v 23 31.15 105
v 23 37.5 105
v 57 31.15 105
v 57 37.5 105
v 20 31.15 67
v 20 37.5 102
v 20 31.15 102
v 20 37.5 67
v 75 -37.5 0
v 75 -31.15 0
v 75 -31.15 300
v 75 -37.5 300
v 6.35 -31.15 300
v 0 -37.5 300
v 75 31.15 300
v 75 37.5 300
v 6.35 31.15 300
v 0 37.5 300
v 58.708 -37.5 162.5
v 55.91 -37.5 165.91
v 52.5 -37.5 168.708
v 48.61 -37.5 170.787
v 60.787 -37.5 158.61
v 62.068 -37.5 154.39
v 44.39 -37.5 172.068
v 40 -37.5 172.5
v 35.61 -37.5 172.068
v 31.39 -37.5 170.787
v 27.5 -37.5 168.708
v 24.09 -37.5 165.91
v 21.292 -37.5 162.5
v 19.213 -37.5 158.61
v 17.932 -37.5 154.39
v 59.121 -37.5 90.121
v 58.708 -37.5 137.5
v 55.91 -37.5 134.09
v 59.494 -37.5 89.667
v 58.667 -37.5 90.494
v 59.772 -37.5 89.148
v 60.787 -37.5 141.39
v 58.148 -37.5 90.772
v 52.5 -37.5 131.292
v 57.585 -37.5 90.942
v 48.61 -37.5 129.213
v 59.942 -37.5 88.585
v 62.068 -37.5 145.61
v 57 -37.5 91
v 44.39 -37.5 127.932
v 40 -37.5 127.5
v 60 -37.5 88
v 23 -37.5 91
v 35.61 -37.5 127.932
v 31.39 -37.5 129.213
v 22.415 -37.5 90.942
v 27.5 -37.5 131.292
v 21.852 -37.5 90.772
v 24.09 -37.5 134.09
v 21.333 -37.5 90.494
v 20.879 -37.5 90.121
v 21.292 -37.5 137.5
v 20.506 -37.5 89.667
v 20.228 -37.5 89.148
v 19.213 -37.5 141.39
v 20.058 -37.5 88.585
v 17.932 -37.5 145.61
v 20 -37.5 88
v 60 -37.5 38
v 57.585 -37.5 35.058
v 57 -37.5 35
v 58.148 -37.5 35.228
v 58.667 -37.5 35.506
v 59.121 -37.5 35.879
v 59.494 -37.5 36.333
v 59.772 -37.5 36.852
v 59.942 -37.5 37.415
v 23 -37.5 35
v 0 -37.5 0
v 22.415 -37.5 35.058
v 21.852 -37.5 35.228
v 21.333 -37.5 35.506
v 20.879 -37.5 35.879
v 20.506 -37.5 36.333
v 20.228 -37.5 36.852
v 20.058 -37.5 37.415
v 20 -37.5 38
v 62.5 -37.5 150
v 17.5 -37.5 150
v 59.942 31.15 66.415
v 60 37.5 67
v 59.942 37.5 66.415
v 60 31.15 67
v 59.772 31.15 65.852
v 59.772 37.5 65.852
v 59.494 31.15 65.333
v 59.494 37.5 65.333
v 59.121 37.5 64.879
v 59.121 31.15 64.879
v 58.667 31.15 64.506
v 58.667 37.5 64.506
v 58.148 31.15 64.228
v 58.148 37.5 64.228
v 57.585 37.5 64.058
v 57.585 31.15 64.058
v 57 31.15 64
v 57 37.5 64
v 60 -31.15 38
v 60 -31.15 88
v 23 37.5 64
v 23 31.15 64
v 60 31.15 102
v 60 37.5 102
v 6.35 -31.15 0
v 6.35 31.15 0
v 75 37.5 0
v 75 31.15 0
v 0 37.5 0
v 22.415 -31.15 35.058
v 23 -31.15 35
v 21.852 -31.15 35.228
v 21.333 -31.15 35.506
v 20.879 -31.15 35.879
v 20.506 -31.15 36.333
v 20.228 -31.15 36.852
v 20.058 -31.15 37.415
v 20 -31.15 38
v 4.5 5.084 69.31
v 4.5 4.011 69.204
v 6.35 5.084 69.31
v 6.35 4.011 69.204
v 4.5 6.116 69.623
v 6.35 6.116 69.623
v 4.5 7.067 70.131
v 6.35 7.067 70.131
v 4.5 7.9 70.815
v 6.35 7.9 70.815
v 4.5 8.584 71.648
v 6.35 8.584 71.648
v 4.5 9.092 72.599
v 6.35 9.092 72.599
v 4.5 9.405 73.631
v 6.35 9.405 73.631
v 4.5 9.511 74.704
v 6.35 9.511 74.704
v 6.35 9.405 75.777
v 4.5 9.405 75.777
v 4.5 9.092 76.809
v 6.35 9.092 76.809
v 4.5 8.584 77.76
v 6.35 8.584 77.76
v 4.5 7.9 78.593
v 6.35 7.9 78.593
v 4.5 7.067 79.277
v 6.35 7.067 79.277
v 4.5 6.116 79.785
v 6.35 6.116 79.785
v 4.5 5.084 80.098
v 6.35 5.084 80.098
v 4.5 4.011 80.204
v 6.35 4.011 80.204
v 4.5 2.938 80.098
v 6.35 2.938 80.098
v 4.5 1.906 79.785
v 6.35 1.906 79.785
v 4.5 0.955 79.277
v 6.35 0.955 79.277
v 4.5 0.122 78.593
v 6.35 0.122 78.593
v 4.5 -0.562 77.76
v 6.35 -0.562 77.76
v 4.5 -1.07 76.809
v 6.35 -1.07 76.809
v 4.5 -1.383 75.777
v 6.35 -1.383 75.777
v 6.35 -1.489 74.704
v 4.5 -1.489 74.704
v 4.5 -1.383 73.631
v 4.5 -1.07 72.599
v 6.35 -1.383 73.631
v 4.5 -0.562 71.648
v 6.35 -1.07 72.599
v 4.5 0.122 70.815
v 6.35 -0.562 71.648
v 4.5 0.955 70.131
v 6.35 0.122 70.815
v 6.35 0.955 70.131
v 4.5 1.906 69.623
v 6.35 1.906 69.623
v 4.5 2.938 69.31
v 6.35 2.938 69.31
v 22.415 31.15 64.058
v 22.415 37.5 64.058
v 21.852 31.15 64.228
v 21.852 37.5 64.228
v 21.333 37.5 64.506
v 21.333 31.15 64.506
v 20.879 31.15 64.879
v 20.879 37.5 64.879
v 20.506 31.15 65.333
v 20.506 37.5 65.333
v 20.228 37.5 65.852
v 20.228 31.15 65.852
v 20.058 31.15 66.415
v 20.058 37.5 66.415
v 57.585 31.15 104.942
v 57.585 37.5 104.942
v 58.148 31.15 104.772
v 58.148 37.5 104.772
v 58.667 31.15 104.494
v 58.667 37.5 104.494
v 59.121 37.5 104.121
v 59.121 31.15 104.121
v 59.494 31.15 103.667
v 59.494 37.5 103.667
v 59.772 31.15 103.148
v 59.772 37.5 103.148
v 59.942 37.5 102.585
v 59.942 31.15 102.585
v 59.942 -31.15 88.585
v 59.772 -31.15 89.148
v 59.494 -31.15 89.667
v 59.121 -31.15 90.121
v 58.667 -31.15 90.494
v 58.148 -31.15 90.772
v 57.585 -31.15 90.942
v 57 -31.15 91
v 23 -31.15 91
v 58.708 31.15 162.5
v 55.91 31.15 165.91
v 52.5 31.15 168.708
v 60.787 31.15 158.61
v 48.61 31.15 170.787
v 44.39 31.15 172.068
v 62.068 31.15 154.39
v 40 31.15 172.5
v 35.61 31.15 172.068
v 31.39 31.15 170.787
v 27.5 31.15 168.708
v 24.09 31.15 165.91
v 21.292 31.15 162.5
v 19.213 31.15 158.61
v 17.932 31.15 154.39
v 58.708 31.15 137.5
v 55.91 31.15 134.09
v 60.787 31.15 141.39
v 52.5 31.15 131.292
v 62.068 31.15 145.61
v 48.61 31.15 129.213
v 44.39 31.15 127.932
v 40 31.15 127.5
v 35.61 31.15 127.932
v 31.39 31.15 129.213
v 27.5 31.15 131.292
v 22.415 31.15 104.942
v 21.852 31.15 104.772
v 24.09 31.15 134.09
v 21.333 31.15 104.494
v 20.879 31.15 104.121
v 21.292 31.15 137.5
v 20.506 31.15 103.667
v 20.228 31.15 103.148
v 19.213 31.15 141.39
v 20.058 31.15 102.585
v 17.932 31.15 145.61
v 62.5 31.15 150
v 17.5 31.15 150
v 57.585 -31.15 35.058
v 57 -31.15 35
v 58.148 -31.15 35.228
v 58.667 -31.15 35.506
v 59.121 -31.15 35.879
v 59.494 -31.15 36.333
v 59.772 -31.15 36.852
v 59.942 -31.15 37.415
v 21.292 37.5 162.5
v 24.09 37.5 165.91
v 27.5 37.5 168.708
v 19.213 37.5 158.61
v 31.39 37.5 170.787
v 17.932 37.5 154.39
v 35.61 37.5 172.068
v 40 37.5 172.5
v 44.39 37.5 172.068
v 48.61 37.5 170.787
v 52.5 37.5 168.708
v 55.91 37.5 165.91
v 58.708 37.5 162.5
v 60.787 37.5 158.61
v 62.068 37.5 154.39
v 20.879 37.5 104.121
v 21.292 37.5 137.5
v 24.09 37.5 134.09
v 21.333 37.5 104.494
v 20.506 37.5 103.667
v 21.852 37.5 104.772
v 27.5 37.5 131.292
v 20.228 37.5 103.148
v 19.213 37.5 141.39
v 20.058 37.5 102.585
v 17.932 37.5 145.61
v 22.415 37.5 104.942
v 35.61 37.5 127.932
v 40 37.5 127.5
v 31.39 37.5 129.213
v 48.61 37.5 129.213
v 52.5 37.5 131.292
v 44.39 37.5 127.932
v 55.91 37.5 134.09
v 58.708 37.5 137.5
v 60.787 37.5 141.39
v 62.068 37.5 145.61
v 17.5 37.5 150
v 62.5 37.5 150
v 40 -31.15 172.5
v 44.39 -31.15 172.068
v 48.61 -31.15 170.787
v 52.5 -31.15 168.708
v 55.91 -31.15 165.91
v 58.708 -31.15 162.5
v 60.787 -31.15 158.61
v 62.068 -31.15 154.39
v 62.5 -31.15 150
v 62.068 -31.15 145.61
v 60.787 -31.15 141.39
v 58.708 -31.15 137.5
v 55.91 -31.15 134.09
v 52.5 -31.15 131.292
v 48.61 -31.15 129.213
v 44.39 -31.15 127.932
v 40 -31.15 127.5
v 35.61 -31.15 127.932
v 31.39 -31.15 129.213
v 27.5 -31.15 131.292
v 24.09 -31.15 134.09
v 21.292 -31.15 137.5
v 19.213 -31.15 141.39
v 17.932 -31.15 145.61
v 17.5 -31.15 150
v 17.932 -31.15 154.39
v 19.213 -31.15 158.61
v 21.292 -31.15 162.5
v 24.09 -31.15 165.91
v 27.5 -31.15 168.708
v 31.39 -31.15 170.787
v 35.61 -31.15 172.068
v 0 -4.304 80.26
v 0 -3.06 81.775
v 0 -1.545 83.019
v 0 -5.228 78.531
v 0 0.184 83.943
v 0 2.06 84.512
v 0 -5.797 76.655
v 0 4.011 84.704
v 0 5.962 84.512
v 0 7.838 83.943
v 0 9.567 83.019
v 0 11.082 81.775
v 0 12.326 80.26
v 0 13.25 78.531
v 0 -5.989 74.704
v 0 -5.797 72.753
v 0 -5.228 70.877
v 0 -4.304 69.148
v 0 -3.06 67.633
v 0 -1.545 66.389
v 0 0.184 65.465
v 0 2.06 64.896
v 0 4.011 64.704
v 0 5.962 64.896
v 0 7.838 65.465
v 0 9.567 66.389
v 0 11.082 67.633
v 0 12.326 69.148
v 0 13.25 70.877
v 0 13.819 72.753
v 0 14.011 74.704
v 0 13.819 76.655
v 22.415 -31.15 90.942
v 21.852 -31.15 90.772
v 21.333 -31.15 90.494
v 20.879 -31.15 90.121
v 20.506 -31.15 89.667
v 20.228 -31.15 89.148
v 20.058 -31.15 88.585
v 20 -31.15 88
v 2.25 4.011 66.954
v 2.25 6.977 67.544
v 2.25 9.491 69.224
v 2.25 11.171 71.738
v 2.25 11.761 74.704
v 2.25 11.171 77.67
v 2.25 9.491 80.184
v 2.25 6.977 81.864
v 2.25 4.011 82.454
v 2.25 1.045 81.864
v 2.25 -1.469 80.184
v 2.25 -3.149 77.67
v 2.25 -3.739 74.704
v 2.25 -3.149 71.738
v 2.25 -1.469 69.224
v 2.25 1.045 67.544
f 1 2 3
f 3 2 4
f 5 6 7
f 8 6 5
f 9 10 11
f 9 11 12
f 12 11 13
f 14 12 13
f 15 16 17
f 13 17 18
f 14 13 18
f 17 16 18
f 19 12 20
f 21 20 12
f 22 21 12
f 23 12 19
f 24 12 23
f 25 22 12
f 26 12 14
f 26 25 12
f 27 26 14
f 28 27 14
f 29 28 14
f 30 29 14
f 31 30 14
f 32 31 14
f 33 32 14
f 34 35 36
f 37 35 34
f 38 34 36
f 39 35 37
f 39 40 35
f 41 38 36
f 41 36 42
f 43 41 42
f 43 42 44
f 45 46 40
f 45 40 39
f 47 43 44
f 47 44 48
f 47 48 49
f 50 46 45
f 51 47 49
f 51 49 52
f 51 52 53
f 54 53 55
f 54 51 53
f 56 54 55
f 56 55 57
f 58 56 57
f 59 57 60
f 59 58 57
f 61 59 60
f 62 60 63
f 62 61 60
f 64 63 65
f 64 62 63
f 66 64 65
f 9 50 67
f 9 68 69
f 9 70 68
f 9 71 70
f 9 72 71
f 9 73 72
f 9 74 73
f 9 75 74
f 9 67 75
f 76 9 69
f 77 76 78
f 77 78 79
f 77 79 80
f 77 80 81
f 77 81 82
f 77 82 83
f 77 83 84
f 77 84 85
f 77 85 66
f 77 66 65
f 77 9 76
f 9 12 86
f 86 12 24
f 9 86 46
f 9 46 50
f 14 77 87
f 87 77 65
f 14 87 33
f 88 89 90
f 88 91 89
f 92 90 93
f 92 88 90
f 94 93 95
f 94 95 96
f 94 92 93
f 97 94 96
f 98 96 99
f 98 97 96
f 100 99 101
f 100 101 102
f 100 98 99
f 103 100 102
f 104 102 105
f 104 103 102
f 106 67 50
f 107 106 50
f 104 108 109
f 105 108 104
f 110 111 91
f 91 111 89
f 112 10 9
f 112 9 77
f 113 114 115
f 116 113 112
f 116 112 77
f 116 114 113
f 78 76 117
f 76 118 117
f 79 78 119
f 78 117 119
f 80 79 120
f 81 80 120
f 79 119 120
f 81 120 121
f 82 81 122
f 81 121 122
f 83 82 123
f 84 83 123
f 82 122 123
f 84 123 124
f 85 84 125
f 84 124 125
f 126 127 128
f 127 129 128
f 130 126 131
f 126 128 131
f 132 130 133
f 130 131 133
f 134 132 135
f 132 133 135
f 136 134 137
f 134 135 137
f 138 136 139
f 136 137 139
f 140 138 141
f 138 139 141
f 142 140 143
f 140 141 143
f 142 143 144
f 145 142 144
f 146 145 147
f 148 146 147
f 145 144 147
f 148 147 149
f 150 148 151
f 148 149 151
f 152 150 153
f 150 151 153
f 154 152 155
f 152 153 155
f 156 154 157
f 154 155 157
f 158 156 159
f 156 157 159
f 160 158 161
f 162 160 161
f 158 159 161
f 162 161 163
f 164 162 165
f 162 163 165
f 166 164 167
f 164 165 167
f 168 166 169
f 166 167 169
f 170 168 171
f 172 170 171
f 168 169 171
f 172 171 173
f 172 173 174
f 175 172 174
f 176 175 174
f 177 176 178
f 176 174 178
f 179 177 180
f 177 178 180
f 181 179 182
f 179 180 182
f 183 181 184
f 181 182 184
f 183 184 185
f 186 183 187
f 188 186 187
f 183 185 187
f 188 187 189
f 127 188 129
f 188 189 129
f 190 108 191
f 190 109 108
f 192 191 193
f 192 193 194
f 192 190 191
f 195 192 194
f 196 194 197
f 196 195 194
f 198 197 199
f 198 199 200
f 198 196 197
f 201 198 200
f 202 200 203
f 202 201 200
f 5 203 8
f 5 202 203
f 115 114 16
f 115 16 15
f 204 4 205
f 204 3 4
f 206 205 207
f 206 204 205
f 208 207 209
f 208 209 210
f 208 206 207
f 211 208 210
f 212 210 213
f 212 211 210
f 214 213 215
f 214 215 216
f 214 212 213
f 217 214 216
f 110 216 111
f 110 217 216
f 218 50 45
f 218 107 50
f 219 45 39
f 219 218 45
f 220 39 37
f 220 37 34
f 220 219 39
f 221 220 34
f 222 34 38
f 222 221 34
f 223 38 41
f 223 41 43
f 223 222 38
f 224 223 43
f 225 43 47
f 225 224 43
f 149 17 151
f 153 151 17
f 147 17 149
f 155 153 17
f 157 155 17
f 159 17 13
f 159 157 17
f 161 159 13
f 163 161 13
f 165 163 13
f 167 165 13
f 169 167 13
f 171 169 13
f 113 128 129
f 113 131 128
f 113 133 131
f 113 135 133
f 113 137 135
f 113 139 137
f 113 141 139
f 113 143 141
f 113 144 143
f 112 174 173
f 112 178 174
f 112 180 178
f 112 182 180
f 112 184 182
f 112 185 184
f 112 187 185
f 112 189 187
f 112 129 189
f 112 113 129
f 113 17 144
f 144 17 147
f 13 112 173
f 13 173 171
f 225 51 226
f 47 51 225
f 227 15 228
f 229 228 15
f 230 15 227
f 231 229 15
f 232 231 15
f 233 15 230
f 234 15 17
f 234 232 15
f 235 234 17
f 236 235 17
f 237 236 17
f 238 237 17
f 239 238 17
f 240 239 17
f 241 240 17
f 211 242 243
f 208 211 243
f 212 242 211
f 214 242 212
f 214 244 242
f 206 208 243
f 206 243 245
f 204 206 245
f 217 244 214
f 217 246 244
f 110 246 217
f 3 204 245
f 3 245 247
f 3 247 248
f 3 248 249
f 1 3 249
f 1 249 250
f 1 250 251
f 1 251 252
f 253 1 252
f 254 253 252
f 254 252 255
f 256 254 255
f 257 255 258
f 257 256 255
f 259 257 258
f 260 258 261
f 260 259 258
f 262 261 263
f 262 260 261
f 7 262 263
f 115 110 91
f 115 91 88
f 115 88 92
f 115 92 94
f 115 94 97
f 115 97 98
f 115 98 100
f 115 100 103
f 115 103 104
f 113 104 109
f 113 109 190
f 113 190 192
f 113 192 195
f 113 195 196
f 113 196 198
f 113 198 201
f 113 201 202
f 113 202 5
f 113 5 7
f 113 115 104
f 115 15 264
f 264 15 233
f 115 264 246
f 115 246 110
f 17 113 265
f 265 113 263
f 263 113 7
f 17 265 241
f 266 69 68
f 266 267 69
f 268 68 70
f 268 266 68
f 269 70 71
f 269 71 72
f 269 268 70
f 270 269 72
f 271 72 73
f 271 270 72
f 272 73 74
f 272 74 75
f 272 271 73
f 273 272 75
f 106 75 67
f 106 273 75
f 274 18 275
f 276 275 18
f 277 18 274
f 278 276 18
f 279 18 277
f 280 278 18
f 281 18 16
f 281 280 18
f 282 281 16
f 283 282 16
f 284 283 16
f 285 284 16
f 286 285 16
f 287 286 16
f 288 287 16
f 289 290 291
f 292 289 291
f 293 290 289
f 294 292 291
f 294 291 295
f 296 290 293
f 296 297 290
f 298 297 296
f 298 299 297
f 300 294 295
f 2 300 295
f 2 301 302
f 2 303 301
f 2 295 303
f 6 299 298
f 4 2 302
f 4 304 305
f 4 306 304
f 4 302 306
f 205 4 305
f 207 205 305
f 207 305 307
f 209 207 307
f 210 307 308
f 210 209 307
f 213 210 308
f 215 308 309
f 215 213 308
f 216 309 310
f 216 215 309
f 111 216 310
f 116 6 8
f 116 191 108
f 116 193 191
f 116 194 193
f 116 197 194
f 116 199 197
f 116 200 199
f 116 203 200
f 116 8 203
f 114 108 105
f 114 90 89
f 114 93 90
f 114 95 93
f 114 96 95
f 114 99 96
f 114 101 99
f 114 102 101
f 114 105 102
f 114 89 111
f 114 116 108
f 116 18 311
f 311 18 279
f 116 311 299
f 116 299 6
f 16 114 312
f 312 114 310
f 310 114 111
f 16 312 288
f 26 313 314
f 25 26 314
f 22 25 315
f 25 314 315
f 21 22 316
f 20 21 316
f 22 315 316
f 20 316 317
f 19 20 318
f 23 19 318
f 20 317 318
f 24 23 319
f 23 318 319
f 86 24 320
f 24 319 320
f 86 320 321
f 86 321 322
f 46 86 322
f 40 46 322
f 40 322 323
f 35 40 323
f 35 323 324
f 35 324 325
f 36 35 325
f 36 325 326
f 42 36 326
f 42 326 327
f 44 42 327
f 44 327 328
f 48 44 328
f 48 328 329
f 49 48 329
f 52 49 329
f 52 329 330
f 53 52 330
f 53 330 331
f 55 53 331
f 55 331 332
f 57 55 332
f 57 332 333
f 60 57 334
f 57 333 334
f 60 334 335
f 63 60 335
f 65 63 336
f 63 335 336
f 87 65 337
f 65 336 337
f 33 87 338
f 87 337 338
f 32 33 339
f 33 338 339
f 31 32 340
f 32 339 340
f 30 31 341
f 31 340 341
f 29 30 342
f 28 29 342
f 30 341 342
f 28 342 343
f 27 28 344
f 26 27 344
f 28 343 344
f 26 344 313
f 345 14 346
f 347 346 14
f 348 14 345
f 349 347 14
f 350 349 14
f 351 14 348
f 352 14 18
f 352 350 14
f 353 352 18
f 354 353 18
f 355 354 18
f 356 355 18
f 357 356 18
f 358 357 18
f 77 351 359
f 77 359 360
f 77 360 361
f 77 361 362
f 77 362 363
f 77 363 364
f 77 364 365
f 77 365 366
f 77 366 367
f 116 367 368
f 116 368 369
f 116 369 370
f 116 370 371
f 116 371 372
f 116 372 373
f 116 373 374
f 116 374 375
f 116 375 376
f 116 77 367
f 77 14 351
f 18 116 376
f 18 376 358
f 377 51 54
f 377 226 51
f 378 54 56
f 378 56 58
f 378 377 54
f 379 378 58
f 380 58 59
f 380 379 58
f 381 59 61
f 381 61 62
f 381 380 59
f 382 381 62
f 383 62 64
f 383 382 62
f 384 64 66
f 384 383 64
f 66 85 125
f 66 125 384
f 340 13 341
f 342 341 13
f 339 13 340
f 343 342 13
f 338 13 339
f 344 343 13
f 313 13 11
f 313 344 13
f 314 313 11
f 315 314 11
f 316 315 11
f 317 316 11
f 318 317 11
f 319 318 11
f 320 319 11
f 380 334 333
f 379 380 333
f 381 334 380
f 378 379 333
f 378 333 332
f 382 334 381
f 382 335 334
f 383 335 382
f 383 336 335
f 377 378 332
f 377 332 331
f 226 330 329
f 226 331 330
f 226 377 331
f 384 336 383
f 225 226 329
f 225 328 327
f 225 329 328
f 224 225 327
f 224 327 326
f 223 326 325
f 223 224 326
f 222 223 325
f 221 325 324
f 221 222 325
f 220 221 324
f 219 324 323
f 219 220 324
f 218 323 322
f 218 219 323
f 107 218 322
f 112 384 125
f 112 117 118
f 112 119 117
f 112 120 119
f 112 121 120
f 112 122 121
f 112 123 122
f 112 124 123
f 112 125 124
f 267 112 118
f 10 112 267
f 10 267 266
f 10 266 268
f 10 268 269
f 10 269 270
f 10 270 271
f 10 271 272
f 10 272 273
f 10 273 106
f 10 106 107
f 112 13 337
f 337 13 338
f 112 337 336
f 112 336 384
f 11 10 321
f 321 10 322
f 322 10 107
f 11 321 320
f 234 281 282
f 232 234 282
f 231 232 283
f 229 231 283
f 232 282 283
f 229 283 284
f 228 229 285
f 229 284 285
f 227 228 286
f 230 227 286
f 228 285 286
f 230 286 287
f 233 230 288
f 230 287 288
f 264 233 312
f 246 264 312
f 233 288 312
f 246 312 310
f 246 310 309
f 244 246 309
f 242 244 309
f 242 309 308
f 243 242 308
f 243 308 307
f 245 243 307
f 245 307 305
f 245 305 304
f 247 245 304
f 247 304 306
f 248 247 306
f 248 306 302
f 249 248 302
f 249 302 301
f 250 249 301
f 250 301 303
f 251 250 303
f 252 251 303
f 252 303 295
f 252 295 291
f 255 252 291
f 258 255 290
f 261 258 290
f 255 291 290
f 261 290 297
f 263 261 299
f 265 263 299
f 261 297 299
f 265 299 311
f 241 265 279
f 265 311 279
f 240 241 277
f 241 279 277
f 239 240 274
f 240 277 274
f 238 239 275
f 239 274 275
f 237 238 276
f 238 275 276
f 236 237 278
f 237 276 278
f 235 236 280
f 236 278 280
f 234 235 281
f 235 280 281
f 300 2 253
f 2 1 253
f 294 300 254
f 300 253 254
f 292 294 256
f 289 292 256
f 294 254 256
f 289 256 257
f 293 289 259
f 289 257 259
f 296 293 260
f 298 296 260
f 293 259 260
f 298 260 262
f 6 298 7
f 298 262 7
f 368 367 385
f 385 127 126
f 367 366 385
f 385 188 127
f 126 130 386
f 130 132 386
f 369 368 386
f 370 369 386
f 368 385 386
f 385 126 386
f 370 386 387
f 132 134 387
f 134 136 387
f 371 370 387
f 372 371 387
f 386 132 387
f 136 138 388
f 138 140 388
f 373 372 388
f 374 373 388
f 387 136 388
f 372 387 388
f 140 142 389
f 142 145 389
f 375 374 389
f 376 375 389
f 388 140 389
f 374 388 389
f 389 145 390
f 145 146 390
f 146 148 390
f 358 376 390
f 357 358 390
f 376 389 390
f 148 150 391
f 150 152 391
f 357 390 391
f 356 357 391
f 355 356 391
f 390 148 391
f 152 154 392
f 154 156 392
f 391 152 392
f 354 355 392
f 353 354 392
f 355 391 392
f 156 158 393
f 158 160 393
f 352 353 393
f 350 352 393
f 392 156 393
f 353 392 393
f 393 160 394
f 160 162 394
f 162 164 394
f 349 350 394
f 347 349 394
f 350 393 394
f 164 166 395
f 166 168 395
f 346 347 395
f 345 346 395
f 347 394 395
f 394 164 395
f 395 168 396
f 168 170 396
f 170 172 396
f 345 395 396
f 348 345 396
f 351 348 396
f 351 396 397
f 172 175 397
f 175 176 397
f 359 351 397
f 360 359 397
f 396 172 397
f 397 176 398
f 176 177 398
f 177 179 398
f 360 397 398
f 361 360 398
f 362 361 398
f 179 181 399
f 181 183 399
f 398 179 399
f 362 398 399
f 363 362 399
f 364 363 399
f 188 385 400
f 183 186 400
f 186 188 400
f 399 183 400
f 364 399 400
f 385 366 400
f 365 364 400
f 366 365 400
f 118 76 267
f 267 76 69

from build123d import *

# Parameters (mm, degrees)
BOSS_EXTRUDE1_DEPTH                                  = 300
SKETCH2_R                                            = 22.5
CUT_EXTRUDE1_DEPTH                                   = 319.198051534
SKETCH3_W                                            = 40
SKETCH3_H                                            = 56
CUT_EXTRUDE2_DEPTH                                   = 10
SKETCH4_W                                            = 40
SKETCH4_H                                            = 41
CUT_EXTRUDE3_DEPTH                                   = 10
FILLET1_R                                            = 3
CSK_FOR_M10_COUNTERSUNK_FLAT_HEAD_SCREW1_D           = 11
CSK_FOR_M10_COUNTERSUNK_FLAT_HEAD_SCREW1_DEPTH       = 20.003
CSK_FOR_M10_COUNTERSUNK_FLAT_HEAD_SCREW1_CSINK_D     = 20
CSK_FOR_M10_COUNTERSUNK_FLAT_HEAD_SCREW1_CSINK_ANGLE = 90
CSK_FOR_M10_COUNTERSUNK_FLAT_HEAD_SCREW1_TIP         = 3.304733405


with BuildPart() as part:
    # Sketch1 → Boss-Extrude1 (new body)
    with BuildSketch(Plane.XY):
        Polygon((0, -37.5), (0, 37.5), (75, 37.5), (75, 31.15), (6.35, 31.15), (6.35, -31.15), (75, -31.15), (75, -37.5), align=None)
    extrude(amount=BOSS_EXTRUDE1_DEPTH)

    # Sketch2 → Cut-Extrude1 (cut, through all)
    with BuildSketch(Plane(origin=(0, 37.5, 0), x_dir=(1, 0, 0), z_dir=(0, 1, 0))):
        with Locations(Location((40, -150, 0), (0, 0, 270))):
            Circle(SKETCH2_R)
    extrude(amount=-CUT_EXTRUDE1_DEPTH, mode=Mode.SUBTRACT)

    # Sketch3 → Cut-Extrude2 (cut)
    with BuildSketch(Plane.XZ.offset(37.5)):
        with Locations((40, 63)):
            Rectangle(SKETCH3_W, SKETCH3_H)
    extrude(amount=-CUT_EXTRUDE2_DEPTH, mode=Mode.SUBTRACT)

    # Sketch4 → Cut-Extrude3 (cut)
    with BuildSketch(Plane(origin=(0, 37.5, 0), x_dir=(1, 0, 0), z_dir=(0, 1, 0))):
        with Locations((40, -84.5)):
            Rectangle(SKETCH4_W, SKETCH4_H)
    extrude(amount=-CUT_EXTRUDE3_DEPTH, mode=Mode.SUBTRACT)

    # Fillet1
    fillet1_edges = [part.edges().sort_by_distance(p)[0] for p in [
        (20, -34.325, 91),
        (60, -34.325, 91),
        (60, -34.325, 35),
        (20, -34.325, 35),
        (60, 34.325, 105),
        (20, 34.325, 105),
        (20, 34.325, 64),
        (60, 34.325, 64),
    ]]
    fillet(fillet1_edges, radius=FILLET1_R)

    # CSK for M10 Countersunk Flat Head Screw1
    with Locations(Plane.ZY):
        with Locations((74.704121605, 4.01110333)):
            CounterSinkHole(CSK_FOR_M10_COUNTERSUNK_FLAT_HEAD_SCREW1_D / 2, CSK_FOR_M10_COUNTERSUNK_FLAT_HEAD_SCREW1_CSINK_D / 2, depth=CSK_FOR_M10_COUNTERSUNK_FLAT_HEAD_SCREW1_DEPTH, counter_sink_angle=CSK_FOR_M10_COUNTERSUNK_FLAT_HEAD_SCREW1_CSINK_ANGLE)
            with Locations((0, 0, -(CSK_FOR_M10_COUNTERSUNK_FLAT_HEAD_SCREW1_DEPTH + CSK_FOR_M10_COUNTERSUNK_FLAT_HEAD_SCREW1_TIP / 2))):  # 118° drill point
                Cone(0, CSK_FOR_M10_COUNTERSUNK_FLAT_HEAD_SCREW1_D / 2, CSK_FOR_M10_COUNTERSUNK_FLAT_HEAD_SCREW1_TIP, mode=Mode.SUBTRACT)


solid = part.part
